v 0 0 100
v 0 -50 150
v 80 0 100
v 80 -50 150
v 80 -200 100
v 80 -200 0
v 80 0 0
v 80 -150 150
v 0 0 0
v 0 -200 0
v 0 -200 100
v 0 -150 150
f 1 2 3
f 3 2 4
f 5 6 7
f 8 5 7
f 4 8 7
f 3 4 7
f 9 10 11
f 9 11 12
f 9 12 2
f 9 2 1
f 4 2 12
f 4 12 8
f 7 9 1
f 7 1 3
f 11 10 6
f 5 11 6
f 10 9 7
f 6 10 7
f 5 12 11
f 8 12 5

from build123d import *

# Parameters (mm, degrees)
F0_W     = 80
F0_H     = 200
F1_DEPTH = 150
F2_SIZE  = 50


with BuildPart() as f1:
    # F0 (on Top) → F1 (new body)
    with BuildSketch(Plane.XY):
        with Locations((40, -100)):
            Rectangle(F0_W, F0_H)
    extrude(amount=F1_DEPTH)

    # F2
    f2_edges = [f1.edges().sort_by_distance(p)[0] for p in [
        (40, 0, 150),
        (40, -200, 150),
    ]]
    chamfer(f2_edges, length=F2_SIZE)


solid = f1.part
